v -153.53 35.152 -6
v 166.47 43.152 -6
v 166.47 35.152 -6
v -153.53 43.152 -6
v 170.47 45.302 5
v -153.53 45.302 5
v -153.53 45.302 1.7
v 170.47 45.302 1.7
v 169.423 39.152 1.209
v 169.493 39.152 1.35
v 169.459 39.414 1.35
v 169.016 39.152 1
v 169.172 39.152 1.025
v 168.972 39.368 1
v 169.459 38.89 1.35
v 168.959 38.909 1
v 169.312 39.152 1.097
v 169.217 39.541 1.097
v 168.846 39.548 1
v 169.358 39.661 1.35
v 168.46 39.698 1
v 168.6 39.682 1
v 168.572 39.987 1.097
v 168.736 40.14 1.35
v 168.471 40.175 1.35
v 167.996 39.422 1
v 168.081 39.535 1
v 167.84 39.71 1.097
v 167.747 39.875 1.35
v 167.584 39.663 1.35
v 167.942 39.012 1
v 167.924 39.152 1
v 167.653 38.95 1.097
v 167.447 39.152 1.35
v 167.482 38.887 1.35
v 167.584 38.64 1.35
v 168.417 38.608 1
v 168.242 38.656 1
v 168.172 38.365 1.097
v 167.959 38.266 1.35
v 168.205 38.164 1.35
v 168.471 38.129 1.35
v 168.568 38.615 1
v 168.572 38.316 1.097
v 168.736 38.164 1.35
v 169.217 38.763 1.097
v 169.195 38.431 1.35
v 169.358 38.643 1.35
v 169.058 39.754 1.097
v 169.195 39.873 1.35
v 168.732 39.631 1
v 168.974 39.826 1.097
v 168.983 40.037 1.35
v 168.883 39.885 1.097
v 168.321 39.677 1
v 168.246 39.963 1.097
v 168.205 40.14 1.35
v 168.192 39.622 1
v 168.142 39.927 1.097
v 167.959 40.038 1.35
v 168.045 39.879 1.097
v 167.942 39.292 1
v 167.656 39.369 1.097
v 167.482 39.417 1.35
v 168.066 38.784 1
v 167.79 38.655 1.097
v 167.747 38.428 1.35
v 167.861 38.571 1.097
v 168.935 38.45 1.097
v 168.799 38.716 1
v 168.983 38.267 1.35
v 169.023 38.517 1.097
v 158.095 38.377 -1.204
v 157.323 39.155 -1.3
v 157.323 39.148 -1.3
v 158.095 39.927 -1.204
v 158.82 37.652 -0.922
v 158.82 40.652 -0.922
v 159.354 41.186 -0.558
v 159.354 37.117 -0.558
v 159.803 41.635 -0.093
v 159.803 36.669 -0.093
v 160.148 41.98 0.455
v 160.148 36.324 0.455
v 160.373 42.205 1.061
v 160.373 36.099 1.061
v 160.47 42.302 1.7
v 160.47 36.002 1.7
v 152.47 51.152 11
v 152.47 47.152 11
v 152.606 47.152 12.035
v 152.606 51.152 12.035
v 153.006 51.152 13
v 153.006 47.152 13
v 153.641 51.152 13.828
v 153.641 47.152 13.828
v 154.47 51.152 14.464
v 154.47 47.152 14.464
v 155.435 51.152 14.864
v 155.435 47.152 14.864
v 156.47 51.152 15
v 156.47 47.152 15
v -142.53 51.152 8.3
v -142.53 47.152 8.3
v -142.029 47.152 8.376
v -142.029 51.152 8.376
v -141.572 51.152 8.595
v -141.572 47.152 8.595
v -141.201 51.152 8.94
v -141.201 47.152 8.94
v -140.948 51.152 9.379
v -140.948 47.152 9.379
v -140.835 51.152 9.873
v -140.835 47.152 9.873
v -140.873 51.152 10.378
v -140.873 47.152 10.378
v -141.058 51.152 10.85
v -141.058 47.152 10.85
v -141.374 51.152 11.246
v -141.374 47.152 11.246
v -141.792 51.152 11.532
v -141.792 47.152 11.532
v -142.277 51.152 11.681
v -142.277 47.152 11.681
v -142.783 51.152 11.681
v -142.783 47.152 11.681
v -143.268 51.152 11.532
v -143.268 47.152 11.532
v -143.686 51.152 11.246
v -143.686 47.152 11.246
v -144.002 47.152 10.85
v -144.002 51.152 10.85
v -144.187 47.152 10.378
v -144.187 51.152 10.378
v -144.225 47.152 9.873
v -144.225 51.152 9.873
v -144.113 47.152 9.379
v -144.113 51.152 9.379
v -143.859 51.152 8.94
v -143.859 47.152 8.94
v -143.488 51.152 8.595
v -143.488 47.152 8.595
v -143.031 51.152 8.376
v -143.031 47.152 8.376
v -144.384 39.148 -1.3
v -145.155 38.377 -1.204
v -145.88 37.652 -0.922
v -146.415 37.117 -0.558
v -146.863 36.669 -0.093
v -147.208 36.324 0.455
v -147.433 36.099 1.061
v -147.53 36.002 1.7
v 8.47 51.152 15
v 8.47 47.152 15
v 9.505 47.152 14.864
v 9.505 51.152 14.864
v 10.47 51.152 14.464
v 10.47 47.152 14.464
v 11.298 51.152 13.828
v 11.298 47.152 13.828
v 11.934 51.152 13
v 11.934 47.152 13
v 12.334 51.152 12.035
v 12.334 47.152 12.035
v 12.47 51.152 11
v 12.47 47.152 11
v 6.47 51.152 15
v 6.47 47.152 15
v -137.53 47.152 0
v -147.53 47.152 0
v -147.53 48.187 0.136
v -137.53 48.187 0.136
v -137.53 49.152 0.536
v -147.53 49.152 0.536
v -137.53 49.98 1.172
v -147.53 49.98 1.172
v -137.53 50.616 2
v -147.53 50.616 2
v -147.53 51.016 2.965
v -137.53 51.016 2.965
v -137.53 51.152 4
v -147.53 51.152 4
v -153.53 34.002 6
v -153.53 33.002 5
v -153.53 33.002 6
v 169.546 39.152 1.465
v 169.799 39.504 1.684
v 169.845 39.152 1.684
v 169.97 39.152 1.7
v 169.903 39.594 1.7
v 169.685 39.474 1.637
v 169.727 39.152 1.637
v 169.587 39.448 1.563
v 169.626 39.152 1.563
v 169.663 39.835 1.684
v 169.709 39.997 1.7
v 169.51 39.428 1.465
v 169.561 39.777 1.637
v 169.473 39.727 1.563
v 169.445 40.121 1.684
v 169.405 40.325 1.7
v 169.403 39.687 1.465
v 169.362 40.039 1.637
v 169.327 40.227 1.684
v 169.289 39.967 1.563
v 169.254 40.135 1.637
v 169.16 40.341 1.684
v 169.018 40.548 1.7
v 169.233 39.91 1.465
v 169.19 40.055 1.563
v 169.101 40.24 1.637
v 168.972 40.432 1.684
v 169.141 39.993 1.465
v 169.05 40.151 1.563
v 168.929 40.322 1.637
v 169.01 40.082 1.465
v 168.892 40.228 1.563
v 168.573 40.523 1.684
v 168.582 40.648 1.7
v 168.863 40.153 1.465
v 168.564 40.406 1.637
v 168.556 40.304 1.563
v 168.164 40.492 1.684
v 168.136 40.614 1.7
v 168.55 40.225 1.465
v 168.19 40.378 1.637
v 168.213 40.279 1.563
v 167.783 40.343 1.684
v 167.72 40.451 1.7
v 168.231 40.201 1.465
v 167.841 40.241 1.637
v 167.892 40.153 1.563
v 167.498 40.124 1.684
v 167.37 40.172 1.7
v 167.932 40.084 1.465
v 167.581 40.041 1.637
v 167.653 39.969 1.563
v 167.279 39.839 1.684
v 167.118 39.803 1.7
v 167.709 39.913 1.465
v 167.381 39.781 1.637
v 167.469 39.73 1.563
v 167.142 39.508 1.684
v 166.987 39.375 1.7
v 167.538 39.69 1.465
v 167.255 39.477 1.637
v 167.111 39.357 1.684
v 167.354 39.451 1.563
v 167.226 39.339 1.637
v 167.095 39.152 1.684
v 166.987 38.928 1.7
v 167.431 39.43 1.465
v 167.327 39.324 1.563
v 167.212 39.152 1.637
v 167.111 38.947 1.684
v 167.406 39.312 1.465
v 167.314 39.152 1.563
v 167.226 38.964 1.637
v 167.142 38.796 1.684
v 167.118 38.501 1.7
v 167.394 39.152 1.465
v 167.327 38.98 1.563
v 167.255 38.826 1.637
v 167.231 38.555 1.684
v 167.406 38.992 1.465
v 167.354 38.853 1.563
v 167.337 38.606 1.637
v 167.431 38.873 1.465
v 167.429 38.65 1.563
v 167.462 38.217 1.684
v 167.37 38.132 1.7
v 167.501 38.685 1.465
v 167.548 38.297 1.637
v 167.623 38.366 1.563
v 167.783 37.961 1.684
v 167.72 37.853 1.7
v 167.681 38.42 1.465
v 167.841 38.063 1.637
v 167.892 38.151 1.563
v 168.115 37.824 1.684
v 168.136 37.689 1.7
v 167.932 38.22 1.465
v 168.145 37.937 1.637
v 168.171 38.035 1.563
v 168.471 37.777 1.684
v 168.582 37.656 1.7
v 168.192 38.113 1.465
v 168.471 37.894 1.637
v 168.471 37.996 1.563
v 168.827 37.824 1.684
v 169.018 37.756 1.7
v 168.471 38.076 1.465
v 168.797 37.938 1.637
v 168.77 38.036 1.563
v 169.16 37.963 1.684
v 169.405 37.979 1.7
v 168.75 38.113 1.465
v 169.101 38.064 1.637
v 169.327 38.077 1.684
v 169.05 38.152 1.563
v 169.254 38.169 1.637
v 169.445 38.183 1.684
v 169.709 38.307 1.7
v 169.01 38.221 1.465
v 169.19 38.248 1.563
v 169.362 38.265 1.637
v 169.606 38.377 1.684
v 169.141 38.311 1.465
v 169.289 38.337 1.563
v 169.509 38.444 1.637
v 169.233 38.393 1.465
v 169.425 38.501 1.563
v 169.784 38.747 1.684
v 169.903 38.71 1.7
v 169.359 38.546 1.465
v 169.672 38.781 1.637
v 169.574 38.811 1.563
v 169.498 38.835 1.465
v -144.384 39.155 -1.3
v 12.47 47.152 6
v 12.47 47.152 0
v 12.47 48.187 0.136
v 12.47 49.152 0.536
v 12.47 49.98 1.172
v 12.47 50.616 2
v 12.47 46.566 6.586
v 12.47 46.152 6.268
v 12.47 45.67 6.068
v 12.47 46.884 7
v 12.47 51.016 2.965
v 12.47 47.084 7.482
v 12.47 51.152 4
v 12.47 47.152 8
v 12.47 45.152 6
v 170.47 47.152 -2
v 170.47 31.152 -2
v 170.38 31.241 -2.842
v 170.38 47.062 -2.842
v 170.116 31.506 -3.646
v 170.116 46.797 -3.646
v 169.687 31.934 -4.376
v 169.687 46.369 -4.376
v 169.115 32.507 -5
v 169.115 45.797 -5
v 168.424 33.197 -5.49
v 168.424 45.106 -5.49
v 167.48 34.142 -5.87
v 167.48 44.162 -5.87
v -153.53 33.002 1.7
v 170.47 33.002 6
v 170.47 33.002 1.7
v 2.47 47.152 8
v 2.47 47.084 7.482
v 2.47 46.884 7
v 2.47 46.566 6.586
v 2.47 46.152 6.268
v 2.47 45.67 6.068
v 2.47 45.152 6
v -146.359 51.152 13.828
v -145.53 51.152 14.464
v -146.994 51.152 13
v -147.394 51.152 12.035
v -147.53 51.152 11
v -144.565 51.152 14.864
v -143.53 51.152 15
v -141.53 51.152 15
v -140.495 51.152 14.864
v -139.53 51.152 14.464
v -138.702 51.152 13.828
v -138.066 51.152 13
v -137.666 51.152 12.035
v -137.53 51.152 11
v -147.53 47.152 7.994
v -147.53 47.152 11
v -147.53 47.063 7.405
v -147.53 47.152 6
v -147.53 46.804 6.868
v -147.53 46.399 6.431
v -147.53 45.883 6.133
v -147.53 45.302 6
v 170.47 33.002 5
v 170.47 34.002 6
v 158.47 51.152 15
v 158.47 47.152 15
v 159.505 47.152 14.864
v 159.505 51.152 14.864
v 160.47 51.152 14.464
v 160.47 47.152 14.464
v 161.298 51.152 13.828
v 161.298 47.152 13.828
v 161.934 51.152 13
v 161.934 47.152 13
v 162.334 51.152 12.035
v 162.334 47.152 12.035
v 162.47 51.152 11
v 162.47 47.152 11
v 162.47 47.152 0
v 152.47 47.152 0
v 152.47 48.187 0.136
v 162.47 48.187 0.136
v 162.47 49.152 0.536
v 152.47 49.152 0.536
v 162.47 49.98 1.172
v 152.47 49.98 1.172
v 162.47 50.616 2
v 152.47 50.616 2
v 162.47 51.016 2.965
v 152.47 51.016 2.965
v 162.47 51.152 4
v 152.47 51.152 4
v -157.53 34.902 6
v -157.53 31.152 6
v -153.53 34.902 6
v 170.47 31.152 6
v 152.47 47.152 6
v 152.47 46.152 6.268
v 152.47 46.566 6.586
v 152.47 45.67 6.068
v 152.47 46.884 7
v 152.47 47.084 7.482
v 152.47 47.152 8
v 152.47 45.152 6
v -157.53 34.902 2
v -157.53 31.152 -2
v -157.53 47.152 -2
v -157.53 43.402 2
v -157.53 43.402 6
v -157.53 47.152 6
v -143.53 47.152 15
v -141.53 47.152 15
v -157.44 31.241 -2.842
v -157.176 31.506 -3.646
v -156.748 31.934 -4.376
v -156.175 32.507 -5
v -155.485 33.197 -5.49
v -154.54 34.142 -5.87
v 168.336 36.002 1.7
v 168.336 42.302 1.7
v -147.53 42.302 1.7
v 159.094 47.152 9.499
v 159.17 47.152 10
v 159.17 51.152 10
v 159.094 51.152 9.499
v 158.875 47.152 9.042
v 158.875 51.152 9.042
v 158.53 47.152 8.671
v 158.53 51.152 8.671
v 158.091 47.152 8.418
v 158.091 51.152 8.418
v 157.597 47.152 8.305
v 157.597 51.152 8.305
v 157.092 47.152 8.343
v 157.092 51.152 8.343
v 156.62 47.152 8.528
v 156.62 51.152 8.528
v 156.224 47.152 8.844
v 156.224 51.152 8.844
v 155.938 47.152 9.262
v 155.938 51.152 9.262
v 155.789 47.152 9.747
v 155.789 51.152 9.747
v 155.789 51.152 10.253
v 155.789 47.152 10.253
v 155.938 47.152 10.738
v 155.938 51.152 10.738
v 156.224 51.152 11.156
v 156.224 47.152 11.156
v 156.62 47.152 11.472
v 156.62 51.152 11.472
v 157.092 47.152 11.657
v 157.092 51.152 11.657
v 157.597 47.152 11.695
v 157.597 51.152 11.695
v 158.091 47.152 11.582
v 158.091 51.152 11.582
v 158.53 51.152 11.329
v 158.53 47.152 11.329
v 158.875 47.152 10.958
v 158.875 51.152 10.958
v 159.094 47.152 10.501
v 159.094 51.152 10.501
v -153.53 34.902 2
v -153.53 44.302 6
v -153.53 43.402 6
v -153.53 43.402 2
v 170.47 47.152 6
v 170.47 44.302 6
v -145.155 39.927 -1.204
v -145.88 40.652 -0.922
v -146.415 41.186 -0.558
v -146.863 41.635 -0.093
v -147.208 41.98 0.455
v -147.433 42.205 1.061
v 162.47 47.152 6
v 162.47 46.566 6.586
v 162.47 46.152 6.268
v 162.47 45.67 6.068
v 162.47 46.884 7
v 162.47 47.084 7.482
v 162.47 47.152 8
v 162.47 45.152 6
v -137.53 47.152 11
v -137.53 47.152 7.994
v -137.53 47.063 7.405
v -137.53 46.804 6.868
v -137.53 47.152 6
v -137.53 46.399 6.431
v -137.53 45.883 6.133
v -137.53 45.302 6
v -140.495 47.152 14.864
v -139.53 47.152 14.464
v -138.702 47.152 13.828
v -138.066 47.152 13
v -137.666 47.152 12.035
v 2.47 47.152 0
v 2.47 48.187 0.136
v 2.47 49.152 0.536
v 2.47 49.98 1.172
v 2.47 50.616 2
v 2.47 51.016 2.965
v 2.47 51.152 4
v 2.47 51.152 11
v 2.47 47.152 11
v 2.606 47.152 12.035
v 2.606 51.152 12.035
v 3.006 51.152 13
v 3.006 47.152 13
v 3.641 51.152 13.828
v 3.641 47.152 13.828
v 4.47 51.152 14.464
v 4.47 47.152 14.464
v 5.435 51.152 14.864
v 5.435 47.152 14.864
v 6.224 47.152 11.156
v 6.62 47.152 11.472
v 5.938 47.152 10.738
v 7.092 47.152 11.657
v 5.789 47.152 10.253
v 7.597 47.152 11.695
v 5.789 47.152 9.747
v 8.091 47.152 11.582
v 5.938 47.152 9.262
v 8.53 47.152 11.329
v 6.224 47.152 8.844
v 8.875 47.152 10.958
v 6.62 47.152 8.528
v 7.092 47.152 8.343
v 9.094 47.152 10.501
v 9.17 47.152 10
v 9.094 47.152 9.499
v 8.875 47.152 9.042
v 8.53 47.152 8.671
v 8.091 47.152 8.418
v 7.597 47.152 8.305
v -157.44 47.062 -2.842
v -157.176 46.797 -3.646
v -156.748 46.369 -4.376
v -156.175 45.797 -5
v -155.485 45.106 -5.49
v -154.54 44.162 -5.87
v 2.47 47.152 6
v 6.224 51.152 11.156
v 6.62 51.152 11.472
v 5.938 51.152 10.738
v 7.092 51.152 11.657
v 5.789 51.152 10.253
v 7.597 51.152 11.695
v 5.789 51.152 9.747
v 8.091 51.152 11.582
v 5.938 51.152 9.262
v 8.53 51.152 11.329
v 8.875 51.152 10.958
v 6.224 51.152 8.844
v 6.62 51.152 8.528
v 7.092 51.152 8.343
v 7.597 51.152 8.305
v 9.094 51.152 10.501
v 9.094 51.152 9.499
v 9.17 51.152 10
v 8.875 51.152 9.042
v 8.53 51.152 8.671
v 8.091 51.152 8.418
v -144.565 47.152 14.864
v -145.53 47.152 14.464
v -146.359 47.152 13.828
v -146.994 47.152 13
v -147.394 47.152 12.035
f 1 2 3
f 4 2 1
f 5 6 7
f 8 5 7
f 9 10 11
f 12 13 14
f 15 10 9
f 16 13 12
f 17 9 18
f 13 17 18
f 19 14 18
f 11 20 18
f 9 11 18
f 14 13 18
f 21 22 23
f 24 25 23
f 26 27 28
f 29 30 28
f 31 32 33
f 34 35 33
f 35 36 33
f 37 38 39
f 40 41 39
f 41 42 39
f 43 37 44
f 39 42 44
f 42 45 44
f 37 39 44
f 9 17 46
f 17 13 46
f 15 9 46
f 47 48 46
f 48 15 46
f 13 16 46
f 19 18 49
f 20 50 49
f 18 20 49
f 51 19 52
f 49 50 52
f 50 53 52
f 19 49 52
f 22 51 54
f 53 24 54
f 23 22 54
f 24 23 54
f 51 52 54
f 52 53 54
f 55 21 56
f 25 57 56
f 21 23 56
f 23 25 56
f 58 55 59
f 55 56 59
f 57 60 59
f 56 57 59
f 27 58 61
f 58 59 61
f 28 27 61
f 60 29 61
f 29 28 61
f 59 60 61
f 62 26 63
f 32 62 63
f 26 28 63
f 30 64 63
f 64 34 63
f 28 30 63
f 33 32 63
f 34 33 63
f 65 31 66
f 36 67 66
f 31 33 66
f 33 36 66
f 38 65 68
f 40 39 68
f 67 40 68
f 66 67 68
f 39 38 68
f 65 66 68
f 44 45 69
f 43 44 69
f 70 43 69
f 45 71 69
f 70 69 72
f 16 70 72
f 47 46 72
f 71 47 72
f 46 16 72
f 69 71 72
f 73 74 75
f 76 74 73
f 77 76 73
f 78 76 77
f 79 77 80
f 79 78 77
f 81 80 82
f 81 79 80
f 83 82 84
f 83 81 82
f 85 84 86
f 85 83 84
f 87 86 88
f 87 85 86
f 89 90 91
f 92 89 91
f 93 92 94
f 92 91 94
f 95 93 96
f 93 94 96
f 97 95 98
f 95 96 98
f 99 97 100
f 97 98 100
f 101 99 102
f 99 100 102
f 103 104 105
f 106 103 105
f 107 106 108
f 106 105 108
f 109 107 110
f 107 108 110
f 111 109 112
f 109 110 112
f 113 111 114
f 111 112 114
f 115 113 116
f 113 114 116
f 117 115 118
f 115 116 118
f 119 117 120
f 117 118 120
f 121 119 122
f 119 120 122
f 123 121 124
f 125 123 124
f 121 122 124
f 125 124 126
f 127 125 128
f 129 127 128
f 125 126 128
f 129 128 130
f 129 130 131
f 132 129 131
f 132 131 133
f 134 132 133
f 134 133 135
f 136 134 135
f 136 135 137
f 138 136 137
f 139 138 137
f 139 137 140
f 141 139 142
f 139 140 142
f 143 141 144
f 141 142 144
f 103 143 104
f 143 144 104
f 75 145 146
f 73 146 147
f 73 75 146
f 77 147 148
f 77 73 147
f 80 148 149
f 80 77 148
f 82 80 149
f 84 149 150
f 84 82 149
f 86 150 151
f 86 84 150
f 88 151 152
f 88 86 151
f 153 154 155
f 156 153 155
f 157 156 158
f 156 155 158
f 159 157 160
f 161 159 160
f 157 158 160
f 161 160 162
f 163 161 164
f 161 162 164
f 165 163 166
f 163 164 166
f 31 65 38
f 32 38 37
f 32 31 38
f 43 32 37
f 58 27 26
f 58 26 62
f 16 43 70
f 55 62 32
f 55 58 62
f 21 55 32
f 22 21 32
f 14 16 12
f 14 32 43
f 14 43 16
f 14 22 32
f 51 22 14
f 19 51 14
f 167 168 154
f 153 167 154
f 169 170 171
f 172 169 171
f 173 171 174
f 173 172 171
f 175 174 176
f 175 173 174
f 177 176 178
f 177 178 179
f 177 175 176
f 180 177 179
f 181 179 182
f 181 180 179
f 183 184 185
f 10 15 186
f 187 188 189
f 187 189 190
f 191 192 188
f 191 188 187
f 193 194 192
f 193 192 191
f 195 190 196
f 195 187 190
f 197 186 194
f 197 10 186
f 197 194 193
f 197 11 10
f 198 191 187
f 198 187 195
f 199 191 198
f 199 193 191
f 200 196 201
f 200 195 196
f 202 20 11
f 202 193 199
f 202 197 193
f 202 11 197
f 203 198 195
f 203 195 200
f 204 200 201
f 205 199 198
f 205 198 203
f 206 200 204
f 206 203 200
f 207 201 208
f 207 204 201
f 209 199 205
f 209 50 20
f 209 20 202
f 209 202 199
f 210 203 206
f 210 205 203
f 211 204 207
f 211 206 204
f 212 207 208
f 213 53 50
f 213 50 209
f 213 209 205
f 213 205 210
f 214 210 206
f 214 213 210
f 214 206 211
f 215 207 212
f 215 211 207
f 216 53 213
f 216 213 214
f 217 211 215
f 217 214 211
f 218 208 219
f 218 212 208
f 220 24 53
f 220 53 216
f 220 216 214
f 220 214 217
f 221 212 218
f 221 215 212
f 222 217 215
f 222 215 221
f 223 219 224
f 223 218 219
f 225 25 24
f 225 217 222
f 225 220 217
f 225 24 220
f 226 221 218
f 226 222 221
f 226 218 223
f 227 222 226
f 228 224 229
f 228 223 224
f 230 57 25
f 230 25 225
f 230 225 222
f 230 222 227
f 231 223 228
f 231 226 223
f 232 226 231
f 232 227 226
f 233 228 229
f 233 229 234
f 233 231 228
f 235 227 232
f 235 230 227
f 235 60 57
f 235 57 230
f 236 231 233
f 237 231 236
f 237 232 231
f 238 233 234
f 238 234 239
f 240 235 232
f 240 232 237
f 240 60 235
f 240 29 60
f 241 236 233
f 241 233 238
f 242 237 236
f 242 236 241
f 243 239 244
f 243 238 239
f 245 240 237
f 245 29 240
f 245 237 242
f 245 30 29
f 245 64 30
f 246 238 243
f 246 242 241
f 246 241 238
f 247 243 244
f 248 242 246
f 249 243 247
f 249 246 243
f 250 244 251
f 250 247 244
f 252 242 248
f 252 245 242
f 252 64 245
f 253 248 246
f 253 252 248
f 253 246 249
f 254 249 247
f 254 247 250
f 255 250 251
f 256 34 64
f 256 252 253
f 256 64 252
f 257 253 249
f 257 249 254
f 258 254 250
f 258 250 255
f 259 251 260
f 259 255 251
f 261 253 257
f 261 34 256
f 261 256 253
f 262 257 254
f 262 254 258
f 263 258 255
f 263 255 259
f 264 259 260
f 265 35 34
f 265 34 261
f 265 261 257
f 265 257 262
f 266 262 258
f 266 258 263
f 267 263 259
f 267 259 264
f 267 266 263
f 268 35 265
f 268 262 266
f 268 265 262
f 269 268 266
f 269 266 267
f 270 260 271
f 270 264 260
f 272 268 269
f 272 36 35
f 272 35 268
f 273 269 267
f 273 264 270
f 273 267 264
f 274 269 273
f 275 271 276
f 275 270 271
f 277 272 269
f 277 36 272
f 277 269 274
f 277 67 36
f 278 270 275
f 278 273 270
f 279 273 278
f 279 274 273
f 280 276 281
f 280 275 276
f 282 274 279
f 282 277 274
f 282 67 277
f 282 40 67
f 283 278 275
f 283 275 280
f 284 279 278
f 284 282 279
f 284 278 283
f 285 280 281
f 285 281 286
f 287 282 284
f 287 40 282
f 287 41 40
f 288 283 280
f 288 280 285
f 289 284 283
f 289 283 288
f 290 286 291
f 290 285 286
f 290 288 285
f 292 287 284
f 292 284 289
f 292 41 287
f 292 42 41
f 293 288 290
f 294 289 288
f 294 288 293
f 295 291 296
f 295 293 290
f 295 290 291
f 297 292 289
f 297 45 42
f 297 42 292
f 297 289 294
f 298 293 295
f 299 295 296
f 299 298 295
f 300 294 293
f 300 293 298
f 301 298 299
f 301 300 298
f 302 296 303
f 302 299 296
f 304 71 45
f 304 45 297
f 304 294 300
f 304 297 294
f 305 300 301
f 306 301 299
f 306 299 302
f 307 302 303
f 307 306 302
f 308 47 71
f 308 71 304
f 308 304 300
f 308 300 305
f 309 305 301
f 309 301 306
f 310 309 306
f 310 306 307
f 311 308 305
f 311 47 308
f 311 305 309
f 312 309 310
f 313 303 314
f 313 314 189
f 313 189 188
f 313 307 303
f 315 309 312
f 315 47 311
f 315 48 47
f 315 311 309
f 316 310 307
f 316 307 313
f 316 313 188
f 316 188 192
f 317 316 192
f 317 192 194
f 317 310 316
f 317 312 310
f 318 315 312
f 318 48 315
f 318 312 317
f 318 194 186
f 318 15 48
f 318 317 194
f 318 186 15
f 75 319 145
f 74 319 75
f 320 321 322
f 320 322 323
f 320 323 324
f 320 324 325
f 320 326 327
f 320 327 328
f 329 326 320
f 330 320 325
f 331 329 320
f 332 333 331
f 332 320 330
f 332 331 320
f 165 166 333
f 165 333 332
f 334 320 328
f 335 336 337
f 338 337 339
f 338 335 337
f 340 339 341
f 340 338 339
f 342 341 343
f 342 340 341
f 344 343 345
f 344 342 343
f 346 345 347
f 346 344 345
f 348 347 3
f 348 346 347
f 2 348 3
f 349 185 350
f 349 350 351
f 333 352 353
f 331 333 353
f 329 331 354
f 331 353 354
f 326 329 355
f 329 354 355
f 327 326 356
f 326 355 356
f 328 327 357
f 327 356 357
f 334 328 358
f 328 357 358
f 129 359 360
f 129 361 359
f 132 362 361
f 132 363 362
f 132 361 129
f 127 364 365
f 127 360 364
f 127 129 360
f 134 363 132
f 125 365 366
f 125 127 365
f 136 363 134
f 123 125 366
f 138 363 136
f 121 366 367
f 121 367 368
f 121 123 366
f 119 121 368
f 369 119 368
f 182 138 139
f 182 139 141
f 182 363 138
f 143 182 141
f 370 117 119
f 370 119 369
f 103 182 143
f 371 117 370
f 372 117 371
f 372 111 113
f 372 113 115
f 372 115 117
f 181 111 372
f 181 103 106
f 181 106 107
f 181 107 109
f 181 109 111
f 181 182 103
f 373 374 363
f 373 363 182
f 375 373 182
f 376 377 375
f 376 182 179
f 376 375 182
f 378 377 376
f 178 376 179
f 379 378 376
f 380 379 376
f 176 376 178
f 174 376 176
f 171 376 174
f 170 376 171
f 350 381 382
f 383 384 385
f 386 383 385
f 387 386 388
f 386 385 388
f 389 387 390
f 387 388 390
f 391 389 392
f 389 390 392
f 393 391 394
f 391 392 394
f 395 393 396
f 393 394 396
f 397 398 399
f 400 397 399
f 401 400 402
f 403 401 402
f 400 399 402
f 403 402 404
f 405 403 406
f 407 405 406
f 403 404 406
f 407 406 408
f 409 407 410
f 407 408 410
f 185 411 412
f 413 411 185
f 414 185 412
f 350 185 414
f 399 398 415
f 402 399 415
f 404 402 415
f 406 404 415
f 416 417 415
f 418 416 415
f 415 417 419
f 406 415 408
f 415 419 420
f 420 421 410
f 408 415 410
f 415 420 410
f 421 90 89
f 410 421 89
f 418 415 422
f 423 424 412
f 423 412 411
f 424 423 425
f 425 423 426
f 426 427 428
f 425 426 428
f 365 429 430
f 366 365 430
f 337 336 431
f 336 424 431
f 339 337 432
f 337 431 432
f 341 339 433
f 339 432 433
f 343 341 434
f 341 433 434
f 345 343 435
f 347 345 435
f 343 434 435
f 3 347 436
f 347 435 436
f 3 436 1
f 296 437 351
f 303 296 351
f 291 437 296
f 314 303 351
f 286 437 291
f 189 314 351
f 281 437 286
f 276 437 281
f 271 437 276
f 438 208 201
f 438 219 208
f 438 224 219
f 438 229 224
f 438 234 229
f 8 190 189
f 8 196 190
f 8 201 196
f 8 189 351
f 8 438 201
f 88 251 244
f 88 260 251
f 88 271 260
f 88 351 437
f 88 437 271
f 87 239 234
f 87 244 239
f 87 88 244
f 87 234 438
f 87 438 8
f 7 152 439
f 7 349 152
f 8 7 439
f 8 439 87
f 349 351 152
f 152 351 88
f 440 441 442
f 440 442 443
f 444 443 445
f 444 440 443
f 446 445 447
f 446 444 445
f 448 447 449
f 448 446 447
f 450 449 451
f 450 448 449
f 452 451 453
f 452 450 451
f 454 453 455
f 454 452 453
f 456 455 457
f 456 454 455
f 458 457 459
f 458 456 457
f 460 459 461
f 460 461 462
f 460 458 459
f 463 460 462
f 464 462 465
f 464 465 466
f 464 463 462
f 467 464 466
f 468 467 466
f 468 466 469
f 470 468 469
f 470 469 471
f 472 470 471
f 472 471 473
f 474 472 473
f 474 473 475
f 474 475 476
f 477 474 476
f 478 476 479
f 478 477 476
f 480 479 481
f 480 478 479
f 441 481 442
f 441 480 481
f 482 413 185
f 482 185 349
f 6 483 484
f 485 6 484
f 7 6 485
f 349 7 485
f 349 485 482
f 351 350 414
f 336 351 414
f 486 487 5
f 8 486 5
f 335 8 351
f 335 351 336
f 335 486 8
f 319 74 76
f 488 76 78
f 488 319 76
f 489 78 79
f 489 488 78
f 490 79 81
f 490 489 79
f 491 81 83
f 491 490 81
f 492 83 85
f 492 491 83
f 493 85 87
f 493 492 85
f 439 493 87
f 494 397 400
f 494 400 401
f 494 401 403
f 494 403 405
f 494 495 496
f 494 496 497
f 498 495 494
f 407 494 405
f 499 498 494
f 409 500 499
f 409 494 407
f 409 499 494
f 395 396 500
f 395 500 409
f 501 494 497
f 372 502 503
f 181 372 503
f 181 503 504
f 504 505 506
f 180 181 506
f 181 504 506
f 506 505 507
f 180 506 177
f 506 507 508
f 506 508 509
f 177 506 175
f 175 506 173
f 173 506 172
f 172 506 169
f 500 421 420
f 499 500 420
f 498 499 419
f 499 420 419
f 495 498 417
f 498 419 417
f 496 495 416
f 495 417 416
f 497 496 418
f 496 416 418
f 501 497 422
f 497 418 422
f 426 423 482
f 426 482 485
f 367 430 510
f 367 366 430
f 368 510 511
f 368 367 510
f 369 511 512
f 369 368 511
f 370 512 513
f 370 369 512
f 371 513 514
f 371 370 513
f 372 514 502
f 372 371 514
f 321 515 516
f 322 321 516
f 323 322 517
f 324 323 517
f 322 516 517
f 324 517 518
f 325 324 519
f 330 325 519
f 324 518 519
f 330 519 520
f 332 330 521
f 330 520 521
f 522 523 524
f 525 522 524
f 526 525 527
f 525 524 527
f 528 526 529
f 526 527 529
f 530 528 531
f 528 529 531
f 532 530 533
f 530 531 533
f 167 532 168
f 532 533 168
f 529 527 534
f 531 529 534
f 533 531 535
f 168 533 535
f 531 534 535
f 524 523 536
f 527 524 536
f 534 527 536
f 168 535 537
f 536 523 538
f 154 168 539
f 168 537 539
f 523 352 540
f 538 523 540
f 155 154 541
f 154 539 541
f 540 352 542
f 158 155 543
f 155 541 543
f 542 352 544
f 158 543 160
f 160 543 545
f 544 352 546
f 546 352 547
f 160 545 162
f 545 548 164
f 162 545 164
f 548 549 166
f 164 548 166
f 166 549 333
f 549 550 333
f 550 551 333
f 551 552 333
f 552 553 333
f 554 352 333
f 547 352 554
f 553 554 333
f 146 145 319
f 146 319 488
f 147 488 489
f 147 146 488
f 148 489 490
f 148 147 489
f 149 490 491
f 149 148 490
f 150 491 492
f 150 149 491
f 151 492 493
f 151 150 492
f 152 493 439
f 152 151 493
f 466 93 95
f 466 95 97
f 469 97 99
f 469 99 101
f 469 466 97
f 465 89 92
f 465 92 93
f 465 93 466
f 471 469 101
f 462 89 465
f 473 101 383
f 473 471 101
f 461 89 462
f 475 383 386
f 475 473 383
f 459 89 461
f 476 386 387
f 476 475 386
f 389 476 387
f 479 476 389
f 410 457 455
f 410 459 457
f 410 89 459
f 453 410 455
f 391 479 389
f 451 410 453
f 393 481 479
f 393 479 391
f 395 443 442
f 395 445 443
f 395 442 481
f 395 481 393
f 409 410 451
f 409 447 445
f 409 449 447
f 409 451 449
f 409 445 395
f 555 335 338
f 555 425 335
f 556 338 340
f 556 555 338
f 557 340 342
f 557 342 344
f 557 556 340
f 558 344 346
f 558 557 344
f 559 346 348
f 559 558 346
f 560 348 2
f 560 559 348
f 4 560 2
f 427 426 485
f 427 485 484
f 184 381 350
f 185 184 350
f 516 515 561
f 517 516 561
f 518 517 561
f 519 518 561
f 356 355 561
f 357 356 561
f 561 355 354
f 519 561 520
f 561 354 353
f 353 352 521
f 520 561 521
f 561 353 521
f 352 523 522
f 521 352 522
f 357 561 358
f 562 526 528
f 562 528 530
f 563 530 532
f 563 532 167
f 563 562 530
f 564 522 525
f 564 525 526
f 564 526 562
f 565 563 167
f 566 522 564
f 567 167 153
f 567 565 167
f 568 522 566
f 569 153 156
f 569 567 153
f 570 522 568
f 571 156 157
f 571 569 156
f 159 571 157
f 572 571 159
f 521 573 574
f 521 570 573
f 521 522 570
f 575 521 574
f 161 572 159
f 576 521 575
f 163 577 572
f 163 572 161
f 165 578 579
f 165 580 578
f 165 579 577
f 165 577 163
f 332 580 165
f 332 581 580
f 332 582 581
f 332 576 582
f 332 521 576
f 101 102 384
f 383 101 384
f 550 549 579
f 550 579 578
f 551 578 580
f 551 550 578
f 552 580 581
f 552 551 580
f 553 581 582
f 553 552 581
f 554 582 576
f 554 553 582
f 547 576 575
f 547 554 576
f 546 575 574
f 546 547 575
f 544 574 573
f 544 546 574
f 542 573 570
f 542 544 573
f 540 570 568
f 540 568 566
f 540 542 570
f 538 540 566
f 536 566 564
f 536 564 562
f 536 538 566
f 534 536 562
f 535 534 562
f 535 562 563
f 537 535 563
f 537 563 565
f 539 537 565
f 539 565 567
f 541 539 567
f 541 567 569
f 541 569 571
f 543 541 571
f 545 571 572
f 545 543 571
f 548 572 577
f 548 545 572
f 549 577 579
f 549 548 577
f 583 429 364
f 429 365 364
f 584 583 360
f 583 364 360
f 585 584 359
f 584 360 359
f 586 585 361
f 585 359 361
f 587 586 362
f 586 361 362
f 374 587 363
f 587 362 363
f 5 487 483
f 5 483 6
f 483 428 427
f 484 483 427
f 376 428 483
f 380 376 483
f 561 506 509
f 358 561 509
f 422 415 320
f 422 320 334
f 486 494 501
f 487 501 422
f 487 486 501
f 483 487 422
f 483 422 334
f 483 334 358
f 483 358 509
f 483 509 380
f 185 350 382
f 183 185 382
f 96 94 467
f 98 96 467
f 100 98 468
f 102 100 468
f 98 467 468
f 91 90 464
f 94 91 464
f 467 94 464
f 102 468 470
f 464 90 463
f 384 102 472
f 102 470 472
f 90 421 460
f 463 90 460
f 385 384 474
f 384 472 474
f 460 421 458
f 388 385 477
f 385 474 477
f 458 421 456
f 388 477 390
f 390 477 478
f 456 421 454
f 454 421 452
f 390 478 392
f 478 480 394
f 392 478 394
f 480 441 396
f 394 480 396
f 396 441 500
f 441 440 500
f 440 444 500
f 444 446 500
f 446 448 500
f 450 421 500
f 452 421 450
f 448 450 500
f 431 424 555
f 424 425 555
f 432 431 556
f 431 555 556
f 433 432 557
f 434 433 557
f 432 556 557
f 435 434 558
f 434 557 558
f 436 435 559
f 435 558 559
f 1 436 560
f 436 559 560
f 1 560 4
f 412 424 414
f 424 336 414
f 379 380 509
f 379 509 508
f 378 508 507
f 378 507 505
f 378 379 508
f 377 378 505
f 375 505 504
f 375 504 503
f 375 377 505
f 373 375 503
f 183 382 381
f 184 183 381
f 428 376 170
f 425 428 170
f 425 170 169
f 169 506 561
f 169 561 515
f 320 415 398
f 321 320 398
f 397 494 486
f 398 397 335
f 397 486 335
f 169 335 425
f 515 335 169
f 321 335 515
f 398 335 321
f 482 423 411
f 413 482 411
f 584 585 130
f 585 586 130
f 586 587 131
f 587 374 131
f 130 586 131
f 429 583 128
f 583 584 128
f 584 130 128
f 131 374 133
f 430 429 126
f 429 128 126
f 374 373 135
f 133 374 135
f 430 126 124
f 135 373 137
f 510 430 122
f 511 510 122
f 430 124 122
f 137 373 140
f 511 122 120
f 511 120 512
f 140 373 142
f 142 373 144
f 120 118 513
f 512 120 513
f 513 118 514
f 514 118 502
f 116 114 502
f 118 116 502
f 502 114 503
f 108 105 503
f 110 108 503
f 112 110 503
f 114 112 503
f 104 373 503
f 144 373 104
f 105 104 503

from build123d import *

# Parameters (mm, degrees)
SKETCH1_W               = 328
SKETCH1_H               = 16
BOSS_EXTRUDE1_DEPTH     = 6
CUT_EXTRUDE1_DEPTH      = 332.42615789
CUT_EXTRUDE1_DEPTH_BACK = 324
SKETCH3_W               = 4.3
SKETCH3_H               = 12.3
SKETCH13_W              = 10
SKETCH13_H              = 15
BOSS_EXTRUDE5_DEPTH     = 4
FILLET10_R              = 4
SKETCH14_R              = 1.7
CUT_EXTRUDE5_DEPTH      = 4
FILLET11_R              = 4
FILLET12_R              = 4
FILLET22_R              = 2
SKETCH17_W              = 328
SKETCH17_H              = 16
BOSS_EXTRUDE6_DEPTH     = 6
FILLET25_R              = 4
SKETCH18_R              = 1
CUT_EXTRUDE6_DEPTH      = 0.7
FILLET26_R              = 0.5
FILLET27_R              = 0.5
SKETCH21_W              = 4
SKETCH21_H              = 8.5
CUT_EXTRUDE8_DEPTH      = 333.303344903
BOSS_EXTRUDE7_DEPTH     = 324
BOSS_EXTRUDE8_DEPTH     = 324
SKETCH25_W              = 308
SKETCH25_H              = 6.3
CUT_EXTRUDE9_DEPTH      = 3
FILLET29_R              = 3.15
LPATTERN1_START         = 47.151862464
LPATTERN1_OUTLINE_R     = 1.7
LPATTERN1_DEPTH         = 4
LPATTERN1_START_2       = 2.46991404
LPATTERN1_2_DEPTH       = 10
LPATTERN1_START_3       = 152.46991404
LPATTERN1_3_DEPTH       = 10


with BuildPart() as part:
    # Sketch1 → Boss-Extrude1 (new body)
    with BuildSketch(Plane.XY):
        with Locations((6.46991404, 39.151862464)):
            Rectangle(SKETCH1_W, SKETCH1_H)
    extrude(amount=BOSS_EXTRUDE1_DEPTH)

    # Sketch3 → Cut-Extrude1 (cut, two sides: drawn at the far end of the back side and taken through both)
    with BuildSketch(Plane(origin=(170.46991404, 0, 0), x_dir=(0, 0, -1), z_dir=(1, 0, 0)).offset(-CUT_EXTRUDE1_DEPTH_BACK)):
        with Locations((-3.85, 39.151862464)):
            Rectangle(SKETCH3_W, SKETCH3_H)
    extrude(amount=CUT_EXTRUDE1_DEPTH + CUT_EXTRUDE1_DEPTH_BACK, mode=Mode.SUBTRACT)

    # Sketch13 → Boss-Extrude5 (add)
    with BuildSketch(Plane(origin=(0, 47.151862464, 0), x_dir=(1, 0, 0), z_dir=(0, 1, 0))):
        with Locations((-142.53008596, -7.5)):
            Rectangle(SKETCH13_W, SKETCH13_H)
    extrude(amount=BOSS_EXTRUDE5_DEPTH)

    # Fillet10
    fillet10_edges = [part.edges().sort_by_distance(p)[0] for p in [
        (-142.53008596, 51.151862464, 0),
    ]]
    fillet(fillet10_edges, radius=FILLET10_R)

    # Sketch14 → Cut-Extrude5 (cut)
    with BuildSketch(Plane.XZ.offset(-47.151862464)):
        with Locations(Location((-142.53008596, 10, 0), (0, 0, 270))):
            Circle(SKETCH14_R)
    extrude(amount=-CUT_EXTRUDE5_DEPTH, mode=Mode.SUBTRACT)

    # Fillet11
    fillet11_edges = [part.edges().sort_by_distance(p)[0] for p in [
        (-137.53008596, 49.151862464, 15),
    ]]
    fillet(fillet11_edges, radius=FILLET11_R)

    # Fillet12
    fillet12_edges = [part.edges().sort_by_distance(p)[0] for p in [
        (-147.53008596, 49.151862464, 15),
    ]]
    fillet(fillet12_edges, radius=FILLET12_R)

    # Fillet22
    # the kernel refuses this fillet: 2 mm, written as the material it adds along each edge
    with BuildSketch(Plane(origin=(-147.53008596, 47.151862464, 6), x_dir=(0, 0, 1), z_dir=(1, 0, 0))) as fillet22_piece_1:
        with BuildLine():
            CenterArc((1.994367068, 2), FILLET22_R, 184.301222305, 85.698777695)
            Line((0, 1.85), (0, 0))
            Line((0, 0), (1.994367068, 0))
        make_face()
    extrude(amount=10)

    # Sketch17 → Boss-Extrude6 (add)
    with BuildSketch(Plane(origin=(0, 0, 0), x_dir=(-1, 0, 0), z_dir=(0, 0, -1))):
        with Locations((-6.46991404, 39.151862464)):
            Rectangle(SKETCH17_W, SKETCH17_H)
    extrude(amount=BOSS_EXTRUDE6_DEPTH)

    # Fillet25
    fillet25_edges = [part.edges().sort_by_distance(p)[0] for p in [
        (170.46991404, 39.151862464, -6),
        (6.46991404, 31.151862464, -6),
        (-157.53008596, 39.151862464, -6),
        (6.46991404, 47.151862464, -6),
    ]]
    fillet(fillet25_edges, radius=FILLET25_R)

    # Sketch18 → Cut-Extrude6 (cut)
    with BuildSketch(Plane.XY.offset(1.7)):
        with Locations((168.46991404, 39.151862464)):
            Circle(SKETCH18_R)
    extrude(amount=-CUT_EXTRUDE6_DEPTH, mode=Mode.SUBTRACT)

    # Fillet26
    fillet26_edges = [part.edges().sort_by_distance(p)[0] for p in [
        (167.46991404, 39.151862464, 1.7),
    ]]
    fillet(fillet26_edges, radius=FILLET26_R)

    # Fillet27
    fillet27_edges = [part.edges().sort_by_distance(p)[0] for p in [
        (167.46991404, 39.151862464, 1),
    ]]
    fillet(fillet27_edges, radius=FILLET27_R)

    # Sketch21 → Cut-Extrude8 (cut, through all)
    with BuildSketch(Plane.ZY.offset(157.53008596)):
        with Locations((4, 39.151862464)):
            Rectangle(SKETCH21_W, SKETCH21_H)
    extrude(amount=-CUT_EXTRUDE8_DEPTH, mode=Mode.SUBTRACT)

    # Sketch23 → Boss-Extrude7 (add)
    with BuildSketch(Plane(origin=(170.46991404, 0, 0), x_dir=(0, 0, -1), z_dir=(1, 0, 0))):
        Polygon((-6, 45.301862464), (-6, 44.301862464), (-5, 45.301862464), align=None)
    extrude(amount=-BOSS_EXTRUDE7_DEPTH)

    # Sketch25 → Cut-Extrude9 (cut)
    with BuildSketch(Plane.XY.offset(1.7)):
        with Locations((6.46991404, 39.151862464)):
            Rectangle(SKETCH25_W, SKETCH25_H)
    extrude(amount=-CUT_EXTRUDE9_DEPTH, mode=Mode.SUBTRACT)

    # Fillet29
    # the kernel refuses this fillet: 3.15 mm, written as the material it adds along each edge
    with BuildSketch(Plane(origin=(-155.396152321, 42.301862464, -1.3), x_dir=(0, 0, 1), z_dir=(1, 0, 0)), Plane(origin=(168.335980401, 36.001862464, -1.3), x_dir=(0, 0, 1), z_dir=(-1, 0, 0))) as fillet29_piece_1:
        with BuildLine():
            CenterArc((3.15, 3.146426545), FILLET29_R, 180, 87.270597363)
            Line((0, 3.146426545), (0, 0))
            Line((0, 0), (3, 0))
        make_face()
    extrude(amount=323.732132723)
    with BuildSketch(Plane(origin=(160.46991404, 50.167928825, -1.3), x_dir=(0, 0, 1), z_dir=(0, -1, 0))) as fillet29_piece_2_section:
        with BuildLine():
            CenterArc((3.15, 3.146426545), FILLET29_R, 180, 87.270597363)
            Line((0, 3.146426545), (0, 0))
            Line((0, 0), (3, 0))
        make_face()
    fillet29_piece_2 = extrude(amount=22.032132723, mode=Mode.PRIVATE)
    fillet29_piece_2 = split(fillet29_piece_2, bisect_by=Plane(origin=(160.46991404, 31.151862464, -1.3), z_dir=(0, 1, 0)), keep=Keep.TOP, mode=Mode.PRIVATE)
    fillet29_piece_2 = split(fillet29_piece_2, bisect_by=Plane(origin=(160.46991404, 47.151862464, -1.3), z_dir=(0, -1, 0)), keep=Keep.TOP, mode=Mode.PRIVATE)
    add(fillet29_piece_2)
    with BuildSketch(Plane(origin=(-147.53008596, 28.135796103, -1.3), x_dir=(0, 0, 1), z_dir=(0, 1, 0))) as fillet29_piece_3_section:
        with BuildLine():
            CenterArc((3.15, 3.146426545), FILLET29_R, 180, 87.270597363)
            Line((0, 3.146426545), (0, 0))
            Line((0, 0), (3, 0))
        make_face()
    fillet29_piece_3 = extrude(amount=22.032132723, mode=Mode.PRIVATE)
    fillet29_piece_3 = split(fillet29_piece_3, bisect_by=Plane(origin=(-147.53008596, 31.151862464, -1.3), z_dir=(0, 1, 0)), keep=Keep.TOP, mode=Mode.PRIVATE)
    fillet29_piece_3 = split(fillet29_piece_3, bisect_by=Plane(origin=(-147.53008596, 47.151862464, -1.3), z_dir=(0, -1, 0)), keep=Keep.TOP, mode=Mode.PRIVATE)
    add(fillet29_piece_3)

    # LPattern1: read off the stored shape, not the designer's step
    # LPattern1 outline → LPattern1 (add)
    # profile 1 of 2: a face of its own
    with BuildSketch(Plane(origin=(0, 0, 0), x_dir=(1, 0, 0), z_dir=(0, 1, 0)).offset(LPATTERN1_START)):
        with BuildLine():
            Line((12.46991404, -11), (12.46991404, -6))
            Line((12.46991404, -6), (2.46991404, -6))
            Line((2.46991404, -6), (2.46991404, -11))
            ThreePointArc((2.46991404, -11), (3.641486915, -13.828427125), (6.46991404, -15))
            Line((6.46991404, -15), (8.46991404, -15))
            ThreePointArc((8.46991404, -15), (11.298341165, -13.828427125), (12.46991404, -11))
        make_face()
        with Locations((7.46991404, -10)):
            Circle(LPATTERN1_OUTLINE_R, mode=Mode.SUBTRACT)
    # profile 2 of 2: a face of its own
    with BuildSketch(Plane(origin=(0, 0, 0), x_dir=(1, 0, 0), z_dir=(0, 1, 0)).offset(LPATTERN1_START)):
        with BuildLine():
            Line((156.46991404, -15), (158.46991404, -15))
            ThreePointArc((158.46991404, -15), (161.298341165, -13.828427125), (162.46991404, -11))
            Line((162.46991404, -11), (162.46991404, -6))
            Line((162.46991404, -6), (152.46991404, -6))
            Line((152.46991404, -6), (152.46991404, -11))
            ThreePointArc((152.46991404, -11), (153.641486915, -13.828427125), (156.46991404, -15))
        make_face()
        with Locations((157.46991404, -10)):
            Circle(LPATTERN1_OUTLINE_R, mode=Mode.SUBTRACT)
    extrude(amount=LPATTERN1_DEPTH)

    # LPattern1 2 outline → LPattern1 2 (add)
    with BuildSketch(Plane.YZ.offset(LPATTERN1_START_2)):
        with BuildLine():
            Line((45.151862464, 6), (47.151862464, 6))
            Line((47.151862464, 6), (47.151862464, 8))
            ThreePointArc((47.151862464, 8), (46.566076026, 6.585786437), (45.151862464, 6))
        make_face()
        with BuildLine():
            Line((51.151862464, 4), (51.151862464, 6))
            Line((51.151862464, 6), (47.151862464, 6))
            Line((47.151862464, 6), (47.151862464, 0))
            ThreePointArc((47.151862464, 0), (49.980289589, 1.171572875), (51.151862464, 4))
        make_face()
    extrude(amount=LPATTERN1_2_DEPTH)

    # LPattern1 3 outline → LPattern1 3 (add)
    with BuildSketch(Plane.YZ.offset(LPATTERN1_START_3)):
        with BuildLine():
            Line((45.151862464, 6), (47.151862464, 6))
            Line((47.151862464, 6), (47.151862464, 8))
            ThreePointArc((47.151862464, 8), (46.566076026, 6.585786437), (45.151862464, 6))
        make_face()
        with BuildLine():
            Line((51.151862464, 4), (51.151862464, 6))
            Line((51.151862464, 6), (47.151862464, 6))
            Line((47.151862464, 6), (47.151862464, 0))
            ThreePointArc((47.151862464, 0), (49.980289589, 1.171572875), (51.151862464, 4))
        make_face()
    extrude(amount=LPATTERN1_3_DEPTH)


with BuildPart() as body_2:
    # Sketch24 → Boss-Extrude8 (new body)
    with BuildSketch(Plane(origin=(170.46991404, 0, 0), x_dir=(0, 0, -1), z_dir=(1, 0, 0))):
        Polygon((-6, 33.001862464), (-6, 34.001862464), (-5, 33.001862464), align=None)
    extrude(amount=-BOSS_EXTRUDE8_DEPTH)


solid = Compound([part.part, body_2.part])
